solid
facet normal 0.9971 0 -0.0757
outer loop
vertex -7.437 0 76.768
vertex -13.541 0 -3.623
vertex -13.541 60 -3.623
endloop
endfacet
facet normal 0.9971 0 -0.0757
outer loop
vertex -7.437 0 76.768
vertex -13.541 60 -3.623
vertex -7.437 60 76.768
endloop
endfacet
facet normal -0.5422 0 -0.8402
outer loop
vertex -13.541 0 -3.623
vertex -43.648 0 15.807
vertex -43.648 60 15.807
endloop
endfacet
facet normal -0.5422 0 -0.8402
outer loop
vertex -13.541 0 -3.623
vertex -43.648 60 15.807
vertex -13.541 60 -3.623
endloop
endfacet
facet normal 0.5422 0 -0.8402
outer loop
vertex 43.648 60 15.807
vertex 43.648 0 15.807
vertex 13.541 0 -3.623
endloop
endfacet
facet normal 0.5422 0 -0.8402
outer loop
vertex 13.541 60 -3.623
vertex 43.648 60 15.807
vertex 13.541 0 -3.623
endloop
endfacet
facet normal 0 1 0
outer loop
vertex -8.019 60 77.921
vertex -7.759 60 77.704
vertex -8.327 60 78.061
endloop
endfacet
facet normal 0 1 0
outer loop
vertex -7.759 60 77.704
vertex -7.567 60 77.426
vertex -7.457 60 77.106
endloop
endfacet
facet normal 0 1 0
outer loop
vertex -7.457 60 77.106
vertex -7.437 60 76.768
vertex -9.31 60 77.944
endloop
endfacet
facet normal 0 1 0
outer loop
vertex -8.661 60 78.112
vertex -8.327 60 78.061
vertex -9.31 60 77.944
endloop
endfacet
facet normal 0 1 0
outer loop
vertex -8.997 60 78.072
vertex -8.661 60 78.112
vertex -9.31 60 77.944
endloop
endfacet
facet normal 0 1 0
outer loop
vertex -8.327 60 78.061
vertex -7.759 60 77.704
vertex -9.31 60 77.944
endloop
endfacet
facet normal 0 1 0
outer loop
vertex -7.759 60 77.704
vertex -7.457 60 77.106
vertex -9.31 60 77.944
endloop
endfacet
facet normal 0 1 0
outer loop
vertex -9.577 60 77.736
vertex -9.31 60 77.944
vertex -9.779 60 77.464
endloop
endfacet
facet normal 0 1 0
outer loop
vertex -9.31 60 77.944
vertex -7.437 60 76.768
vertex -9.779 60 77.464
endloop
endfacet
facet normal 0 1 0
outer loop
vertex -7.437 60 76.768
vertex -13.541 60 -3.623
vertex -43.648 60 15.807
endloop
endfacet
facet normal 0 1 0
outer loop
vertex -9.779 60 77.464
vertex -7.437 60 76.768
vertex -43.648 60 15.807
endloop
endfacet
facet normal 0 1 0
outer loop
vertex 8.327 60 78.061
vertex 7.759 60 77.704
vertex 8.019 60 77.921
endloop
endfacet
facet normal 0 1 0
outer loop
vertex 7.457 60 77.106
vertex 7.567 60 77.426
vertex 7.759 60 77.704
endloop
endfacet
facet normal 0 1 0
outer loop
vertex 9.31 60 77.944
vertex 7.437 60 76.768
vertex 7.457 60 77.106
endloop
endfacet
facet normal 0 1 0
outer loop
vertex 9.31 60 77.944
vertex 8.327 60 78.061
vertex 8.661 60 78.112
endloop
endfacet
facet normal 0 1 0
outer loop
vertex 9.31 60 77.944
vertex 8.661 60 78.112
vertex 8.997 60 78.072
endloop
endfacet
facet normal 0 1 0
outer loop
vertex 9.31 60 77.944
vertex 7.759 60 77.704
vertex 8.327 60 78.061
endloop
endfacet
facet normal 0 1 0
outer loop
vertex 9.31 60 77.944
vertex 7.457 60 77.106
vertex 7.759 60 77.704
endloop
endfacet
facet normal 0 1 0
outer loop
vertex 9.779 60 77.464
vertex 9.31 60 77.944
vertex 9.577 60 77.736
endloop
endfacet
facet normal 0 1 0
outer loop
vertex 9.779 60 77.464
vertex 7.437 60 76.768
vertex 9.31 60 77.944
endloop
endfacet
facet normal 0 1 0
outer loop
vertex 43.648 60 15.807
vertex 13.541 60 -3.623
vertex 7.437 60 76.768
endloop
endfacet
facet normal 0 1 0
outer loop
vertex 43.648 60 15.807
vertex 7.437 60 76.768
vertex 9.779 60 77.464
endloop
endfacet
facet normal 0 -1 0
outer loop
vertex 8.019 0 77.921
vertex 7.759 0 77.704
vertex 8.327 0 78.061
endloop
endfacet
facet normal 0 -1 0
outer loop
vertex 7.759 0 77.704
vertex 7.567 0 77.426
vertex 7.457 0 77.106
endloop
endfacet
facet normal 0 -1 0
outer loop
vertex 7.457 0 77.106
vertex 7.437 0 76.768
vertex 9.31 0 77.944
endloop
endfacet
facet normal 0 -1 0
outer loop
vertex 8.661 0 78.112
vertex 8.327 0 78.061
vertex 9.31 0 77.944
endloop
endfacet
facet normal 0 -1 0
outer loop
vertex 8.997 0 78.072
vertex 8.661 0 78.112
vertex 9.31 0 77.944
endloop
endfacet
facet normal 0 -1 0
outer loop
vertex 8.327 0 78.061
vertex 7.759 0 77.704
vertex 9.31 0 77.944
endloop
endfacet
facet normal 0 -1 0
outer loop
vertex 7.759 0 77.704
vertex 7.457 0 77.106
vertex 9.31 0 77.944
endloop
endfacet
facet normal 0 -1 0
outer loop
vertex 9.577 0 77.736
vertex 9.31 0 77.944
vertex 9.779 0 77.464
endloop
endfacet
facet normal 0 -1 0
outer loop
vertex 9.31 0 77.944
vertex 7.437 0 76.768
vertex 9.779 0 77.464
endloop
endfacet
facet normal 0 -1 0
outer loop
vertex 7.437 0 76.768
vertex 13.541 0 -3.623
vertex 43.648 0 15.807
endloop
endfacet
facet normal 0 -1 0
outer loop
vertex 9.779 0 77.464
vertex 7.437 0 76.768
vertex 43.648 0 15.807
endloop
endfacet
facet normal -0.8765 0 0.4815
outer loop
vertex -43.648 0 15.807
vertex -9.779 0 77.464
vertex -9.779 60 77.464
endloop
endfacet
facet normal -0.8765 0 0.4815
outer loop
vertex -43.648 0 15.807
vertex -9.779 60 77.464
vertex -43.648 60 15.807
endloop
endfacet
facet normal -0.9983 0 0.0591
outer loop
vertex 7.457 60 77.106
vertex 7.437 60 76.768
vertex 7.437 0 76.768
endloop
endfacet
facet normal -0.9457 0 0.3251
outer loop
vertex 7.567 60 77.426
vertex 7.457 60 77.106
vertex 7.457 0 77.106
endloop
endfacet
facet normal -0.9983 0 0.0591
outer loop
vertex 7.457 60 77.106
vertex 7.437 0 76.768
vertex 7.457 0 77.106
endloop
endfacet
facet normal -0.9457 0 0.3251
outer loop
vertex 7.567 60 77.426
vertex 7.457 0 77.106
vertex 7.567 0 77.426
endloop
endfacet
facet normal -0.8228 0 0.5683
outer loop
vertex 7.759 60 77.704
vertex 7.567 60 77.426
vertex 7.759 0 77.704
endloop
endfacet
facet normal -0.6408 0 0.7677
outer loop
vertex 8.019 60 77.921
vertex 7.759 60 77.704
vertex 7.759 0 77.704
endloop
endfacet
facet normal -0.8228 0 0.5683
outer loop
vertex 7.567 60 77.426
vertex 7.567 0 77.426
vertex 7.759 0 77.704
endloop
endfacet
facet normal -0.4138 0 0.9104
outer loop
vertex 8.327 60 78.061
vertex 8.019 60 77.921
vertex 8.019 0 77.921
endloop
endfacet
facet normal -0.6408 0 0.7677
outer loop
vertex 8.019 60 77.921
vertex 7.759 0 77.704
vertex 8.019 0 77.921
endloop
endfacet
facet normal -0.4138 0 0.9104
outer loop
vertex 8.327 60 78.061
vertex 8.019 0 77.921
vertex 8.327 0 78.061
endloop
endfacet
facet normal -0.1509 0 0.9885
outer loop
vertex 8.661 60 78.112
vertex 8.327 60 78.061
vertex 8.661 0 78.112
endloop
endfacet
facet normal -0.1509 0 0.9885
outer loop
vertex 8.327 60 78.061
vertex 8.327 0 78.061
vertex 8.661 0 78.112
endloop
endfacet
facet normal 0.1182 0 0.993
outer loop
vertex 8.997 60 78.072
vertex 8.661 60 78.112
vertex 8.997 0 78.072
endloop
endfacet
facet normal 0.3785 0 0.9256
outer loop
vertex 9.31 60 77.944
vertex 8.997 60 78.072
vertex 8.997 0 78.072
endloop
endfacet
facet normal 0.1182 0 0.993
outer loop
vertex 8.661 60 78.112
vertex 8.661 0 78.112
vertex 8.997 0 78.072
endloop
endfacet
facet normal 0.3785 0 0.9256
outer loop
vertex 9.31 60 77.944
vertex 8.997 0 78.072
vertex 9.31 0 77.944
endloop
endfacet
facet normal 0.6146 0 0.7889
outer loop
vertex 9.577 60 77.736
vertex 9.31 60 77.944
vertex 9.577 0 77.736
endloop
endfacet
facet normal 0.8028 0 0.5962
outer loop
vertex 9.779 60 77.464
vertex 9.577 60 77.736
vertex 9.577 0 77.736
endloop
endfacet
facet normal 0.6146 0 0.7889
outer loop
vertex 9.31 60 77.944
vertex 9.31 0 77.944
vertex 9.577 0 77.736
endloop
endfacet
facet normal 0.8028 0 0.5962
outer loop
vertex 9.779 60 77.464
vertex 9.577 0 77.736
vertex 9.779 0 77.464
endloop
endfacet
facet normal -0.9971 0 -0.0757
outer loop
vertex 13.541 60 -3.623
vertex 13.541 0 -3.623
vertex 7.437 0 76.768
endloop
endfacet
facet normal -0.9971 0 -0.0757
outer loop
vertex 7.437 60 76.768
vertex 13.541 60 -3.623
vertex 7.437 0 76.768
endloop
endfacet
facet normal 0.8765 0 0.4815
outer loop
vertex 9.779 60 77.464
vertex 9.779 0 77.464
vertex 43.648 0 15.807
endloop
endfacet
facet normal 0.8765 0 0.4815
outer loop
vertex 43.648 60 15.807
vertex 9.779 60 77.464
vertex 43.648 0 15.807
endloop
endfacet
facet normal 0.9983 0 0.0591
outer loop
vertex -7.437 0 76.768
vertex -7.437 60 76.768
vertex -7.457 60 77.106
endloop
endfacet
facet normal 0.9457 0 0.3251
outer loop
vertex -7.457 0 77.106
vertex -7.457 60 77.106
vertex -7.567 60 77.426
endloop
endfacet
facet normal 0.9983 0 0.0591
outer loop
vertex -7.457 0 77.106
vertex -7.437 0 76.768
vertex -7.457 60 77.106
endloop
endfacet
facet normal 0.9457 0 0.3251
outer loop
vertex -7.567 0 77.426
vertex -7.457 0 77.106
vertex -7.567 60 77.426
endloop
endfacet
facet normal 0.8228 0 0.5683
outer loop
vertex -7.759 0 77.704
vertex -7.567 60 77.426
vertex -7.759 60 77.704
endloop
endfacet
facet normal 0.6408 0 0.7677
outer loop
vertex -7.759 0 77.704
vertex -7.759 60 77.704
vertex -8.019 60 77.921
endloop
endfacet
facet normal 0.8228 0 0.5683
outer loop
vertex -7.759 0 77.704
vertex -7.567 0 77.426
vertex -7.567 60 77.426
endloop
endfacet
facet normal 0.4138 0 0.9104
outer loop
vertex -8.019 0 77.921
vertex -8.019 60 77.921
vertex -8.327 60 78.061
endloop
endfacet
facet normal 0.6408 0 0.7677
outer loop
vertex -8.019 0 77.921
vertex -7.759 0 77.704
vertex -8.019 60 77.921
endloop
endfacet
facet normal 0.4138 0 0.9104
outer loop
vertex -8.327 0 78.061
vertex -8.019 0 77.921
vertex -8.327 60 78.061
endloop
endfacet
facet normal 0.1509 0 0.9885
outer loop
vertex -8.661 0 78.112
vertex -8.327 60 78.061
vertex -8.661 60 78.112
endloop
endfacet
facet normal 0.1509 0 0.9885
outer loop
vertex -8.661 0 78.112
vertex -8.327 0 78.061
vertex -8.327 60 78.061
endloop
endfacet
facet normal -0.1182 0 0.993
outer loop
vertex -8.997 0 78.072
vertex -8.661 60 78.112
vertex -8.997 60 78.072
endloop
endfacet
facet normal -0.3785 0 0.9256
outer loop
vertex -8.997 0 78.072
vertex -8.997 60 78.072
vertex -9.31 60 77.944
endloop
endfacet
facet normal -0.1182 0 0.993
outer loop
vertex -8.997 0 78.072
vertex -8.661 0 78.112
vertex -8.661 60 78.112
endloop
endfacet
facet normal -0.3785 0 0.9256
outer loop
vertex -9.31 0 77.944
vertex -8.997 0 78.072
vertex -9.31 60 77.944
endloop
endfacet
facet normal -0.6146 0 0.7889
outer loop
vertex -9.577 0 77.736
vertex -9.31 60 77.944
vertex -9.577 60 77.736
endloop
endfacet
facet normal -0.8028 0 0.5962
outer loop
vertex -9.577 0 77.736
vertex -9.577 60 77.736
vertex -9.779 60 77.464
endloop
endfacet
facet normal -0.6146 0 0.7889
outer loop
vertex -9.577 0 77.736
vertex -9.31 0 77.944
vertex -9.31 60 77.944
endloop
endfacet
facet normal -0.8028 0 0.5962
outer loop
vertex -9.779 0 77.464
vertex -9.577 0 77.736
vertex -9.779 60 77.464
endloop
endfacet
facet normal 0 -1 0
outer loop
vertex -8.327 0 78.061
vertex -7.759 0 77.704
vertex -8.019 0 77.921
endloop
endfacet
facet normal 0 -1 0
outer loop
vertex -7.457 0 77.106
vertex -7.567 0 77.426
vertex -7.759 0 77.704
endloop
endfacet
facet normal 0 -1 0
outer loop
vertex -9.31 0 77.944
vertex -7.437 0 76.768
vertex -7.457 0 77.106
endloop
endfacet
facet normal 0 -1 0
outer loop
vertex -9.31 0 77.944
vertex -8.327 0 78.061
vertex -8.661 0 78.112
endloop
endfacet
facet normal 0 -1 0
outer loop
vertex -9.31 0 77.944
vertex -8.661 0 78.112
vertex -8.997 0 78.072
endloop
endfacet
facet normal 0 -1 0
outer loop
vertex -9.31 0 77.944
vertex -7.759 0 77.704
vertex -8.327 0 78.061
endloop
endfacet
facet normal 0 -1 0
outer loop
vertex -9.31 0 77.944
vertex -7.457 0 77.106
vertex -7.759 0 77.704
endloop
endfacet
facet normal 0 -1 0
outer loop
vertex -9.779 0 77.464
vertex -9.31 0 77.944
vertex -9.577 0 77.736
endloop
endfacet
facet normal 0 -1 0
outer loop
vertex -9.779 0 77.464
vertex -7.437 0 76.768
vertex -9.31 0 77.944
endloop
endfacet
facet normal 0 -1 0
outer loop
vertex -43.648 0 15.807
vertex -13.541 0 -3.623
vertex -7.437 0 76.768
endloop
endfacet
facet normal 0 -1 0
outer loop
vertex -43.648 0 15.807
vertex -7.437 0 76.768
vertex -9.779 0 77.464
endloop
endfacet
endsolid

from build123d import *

# Parameters (mm, degrees)
BOSS_EXTRUDE1_DEPTH = 60


with BuildPart() as part:
    # Sketch2 → Boss-Extrude1 (new body)
    with BuildSketch(Plane(origin=(0, 0, 0), x_dir=(1, 0, 0), z_dir=(0, 1, 0))):
        with BuildLine():
            Line((13.540624936, 3.623045913), (7.436989183, -76.767941202))
            ThreePointArc((7.436989183, -76.767941202), (8.327108076, -78.060720686), (9.778994631, -77.464385319))
            Line((9.778994631, -77.464385319), (43.647777878, -15.806500364))
            Line((43.647777878, -15.806500364), (13.540624936, 3.623045913))
        make_face()
    extrude(amount=BOSS_EXTRUDE1_DEPTH)


with BuildPart() as body_2:
    # Mirror2: mirrored copy
    add(part.part.mirror(Plane(origin=(0, 0, 0), x_dir=(0, 0, 1), z_dir=(1, 0, 0))))


solid = Compound([part.part, body_2.part])
